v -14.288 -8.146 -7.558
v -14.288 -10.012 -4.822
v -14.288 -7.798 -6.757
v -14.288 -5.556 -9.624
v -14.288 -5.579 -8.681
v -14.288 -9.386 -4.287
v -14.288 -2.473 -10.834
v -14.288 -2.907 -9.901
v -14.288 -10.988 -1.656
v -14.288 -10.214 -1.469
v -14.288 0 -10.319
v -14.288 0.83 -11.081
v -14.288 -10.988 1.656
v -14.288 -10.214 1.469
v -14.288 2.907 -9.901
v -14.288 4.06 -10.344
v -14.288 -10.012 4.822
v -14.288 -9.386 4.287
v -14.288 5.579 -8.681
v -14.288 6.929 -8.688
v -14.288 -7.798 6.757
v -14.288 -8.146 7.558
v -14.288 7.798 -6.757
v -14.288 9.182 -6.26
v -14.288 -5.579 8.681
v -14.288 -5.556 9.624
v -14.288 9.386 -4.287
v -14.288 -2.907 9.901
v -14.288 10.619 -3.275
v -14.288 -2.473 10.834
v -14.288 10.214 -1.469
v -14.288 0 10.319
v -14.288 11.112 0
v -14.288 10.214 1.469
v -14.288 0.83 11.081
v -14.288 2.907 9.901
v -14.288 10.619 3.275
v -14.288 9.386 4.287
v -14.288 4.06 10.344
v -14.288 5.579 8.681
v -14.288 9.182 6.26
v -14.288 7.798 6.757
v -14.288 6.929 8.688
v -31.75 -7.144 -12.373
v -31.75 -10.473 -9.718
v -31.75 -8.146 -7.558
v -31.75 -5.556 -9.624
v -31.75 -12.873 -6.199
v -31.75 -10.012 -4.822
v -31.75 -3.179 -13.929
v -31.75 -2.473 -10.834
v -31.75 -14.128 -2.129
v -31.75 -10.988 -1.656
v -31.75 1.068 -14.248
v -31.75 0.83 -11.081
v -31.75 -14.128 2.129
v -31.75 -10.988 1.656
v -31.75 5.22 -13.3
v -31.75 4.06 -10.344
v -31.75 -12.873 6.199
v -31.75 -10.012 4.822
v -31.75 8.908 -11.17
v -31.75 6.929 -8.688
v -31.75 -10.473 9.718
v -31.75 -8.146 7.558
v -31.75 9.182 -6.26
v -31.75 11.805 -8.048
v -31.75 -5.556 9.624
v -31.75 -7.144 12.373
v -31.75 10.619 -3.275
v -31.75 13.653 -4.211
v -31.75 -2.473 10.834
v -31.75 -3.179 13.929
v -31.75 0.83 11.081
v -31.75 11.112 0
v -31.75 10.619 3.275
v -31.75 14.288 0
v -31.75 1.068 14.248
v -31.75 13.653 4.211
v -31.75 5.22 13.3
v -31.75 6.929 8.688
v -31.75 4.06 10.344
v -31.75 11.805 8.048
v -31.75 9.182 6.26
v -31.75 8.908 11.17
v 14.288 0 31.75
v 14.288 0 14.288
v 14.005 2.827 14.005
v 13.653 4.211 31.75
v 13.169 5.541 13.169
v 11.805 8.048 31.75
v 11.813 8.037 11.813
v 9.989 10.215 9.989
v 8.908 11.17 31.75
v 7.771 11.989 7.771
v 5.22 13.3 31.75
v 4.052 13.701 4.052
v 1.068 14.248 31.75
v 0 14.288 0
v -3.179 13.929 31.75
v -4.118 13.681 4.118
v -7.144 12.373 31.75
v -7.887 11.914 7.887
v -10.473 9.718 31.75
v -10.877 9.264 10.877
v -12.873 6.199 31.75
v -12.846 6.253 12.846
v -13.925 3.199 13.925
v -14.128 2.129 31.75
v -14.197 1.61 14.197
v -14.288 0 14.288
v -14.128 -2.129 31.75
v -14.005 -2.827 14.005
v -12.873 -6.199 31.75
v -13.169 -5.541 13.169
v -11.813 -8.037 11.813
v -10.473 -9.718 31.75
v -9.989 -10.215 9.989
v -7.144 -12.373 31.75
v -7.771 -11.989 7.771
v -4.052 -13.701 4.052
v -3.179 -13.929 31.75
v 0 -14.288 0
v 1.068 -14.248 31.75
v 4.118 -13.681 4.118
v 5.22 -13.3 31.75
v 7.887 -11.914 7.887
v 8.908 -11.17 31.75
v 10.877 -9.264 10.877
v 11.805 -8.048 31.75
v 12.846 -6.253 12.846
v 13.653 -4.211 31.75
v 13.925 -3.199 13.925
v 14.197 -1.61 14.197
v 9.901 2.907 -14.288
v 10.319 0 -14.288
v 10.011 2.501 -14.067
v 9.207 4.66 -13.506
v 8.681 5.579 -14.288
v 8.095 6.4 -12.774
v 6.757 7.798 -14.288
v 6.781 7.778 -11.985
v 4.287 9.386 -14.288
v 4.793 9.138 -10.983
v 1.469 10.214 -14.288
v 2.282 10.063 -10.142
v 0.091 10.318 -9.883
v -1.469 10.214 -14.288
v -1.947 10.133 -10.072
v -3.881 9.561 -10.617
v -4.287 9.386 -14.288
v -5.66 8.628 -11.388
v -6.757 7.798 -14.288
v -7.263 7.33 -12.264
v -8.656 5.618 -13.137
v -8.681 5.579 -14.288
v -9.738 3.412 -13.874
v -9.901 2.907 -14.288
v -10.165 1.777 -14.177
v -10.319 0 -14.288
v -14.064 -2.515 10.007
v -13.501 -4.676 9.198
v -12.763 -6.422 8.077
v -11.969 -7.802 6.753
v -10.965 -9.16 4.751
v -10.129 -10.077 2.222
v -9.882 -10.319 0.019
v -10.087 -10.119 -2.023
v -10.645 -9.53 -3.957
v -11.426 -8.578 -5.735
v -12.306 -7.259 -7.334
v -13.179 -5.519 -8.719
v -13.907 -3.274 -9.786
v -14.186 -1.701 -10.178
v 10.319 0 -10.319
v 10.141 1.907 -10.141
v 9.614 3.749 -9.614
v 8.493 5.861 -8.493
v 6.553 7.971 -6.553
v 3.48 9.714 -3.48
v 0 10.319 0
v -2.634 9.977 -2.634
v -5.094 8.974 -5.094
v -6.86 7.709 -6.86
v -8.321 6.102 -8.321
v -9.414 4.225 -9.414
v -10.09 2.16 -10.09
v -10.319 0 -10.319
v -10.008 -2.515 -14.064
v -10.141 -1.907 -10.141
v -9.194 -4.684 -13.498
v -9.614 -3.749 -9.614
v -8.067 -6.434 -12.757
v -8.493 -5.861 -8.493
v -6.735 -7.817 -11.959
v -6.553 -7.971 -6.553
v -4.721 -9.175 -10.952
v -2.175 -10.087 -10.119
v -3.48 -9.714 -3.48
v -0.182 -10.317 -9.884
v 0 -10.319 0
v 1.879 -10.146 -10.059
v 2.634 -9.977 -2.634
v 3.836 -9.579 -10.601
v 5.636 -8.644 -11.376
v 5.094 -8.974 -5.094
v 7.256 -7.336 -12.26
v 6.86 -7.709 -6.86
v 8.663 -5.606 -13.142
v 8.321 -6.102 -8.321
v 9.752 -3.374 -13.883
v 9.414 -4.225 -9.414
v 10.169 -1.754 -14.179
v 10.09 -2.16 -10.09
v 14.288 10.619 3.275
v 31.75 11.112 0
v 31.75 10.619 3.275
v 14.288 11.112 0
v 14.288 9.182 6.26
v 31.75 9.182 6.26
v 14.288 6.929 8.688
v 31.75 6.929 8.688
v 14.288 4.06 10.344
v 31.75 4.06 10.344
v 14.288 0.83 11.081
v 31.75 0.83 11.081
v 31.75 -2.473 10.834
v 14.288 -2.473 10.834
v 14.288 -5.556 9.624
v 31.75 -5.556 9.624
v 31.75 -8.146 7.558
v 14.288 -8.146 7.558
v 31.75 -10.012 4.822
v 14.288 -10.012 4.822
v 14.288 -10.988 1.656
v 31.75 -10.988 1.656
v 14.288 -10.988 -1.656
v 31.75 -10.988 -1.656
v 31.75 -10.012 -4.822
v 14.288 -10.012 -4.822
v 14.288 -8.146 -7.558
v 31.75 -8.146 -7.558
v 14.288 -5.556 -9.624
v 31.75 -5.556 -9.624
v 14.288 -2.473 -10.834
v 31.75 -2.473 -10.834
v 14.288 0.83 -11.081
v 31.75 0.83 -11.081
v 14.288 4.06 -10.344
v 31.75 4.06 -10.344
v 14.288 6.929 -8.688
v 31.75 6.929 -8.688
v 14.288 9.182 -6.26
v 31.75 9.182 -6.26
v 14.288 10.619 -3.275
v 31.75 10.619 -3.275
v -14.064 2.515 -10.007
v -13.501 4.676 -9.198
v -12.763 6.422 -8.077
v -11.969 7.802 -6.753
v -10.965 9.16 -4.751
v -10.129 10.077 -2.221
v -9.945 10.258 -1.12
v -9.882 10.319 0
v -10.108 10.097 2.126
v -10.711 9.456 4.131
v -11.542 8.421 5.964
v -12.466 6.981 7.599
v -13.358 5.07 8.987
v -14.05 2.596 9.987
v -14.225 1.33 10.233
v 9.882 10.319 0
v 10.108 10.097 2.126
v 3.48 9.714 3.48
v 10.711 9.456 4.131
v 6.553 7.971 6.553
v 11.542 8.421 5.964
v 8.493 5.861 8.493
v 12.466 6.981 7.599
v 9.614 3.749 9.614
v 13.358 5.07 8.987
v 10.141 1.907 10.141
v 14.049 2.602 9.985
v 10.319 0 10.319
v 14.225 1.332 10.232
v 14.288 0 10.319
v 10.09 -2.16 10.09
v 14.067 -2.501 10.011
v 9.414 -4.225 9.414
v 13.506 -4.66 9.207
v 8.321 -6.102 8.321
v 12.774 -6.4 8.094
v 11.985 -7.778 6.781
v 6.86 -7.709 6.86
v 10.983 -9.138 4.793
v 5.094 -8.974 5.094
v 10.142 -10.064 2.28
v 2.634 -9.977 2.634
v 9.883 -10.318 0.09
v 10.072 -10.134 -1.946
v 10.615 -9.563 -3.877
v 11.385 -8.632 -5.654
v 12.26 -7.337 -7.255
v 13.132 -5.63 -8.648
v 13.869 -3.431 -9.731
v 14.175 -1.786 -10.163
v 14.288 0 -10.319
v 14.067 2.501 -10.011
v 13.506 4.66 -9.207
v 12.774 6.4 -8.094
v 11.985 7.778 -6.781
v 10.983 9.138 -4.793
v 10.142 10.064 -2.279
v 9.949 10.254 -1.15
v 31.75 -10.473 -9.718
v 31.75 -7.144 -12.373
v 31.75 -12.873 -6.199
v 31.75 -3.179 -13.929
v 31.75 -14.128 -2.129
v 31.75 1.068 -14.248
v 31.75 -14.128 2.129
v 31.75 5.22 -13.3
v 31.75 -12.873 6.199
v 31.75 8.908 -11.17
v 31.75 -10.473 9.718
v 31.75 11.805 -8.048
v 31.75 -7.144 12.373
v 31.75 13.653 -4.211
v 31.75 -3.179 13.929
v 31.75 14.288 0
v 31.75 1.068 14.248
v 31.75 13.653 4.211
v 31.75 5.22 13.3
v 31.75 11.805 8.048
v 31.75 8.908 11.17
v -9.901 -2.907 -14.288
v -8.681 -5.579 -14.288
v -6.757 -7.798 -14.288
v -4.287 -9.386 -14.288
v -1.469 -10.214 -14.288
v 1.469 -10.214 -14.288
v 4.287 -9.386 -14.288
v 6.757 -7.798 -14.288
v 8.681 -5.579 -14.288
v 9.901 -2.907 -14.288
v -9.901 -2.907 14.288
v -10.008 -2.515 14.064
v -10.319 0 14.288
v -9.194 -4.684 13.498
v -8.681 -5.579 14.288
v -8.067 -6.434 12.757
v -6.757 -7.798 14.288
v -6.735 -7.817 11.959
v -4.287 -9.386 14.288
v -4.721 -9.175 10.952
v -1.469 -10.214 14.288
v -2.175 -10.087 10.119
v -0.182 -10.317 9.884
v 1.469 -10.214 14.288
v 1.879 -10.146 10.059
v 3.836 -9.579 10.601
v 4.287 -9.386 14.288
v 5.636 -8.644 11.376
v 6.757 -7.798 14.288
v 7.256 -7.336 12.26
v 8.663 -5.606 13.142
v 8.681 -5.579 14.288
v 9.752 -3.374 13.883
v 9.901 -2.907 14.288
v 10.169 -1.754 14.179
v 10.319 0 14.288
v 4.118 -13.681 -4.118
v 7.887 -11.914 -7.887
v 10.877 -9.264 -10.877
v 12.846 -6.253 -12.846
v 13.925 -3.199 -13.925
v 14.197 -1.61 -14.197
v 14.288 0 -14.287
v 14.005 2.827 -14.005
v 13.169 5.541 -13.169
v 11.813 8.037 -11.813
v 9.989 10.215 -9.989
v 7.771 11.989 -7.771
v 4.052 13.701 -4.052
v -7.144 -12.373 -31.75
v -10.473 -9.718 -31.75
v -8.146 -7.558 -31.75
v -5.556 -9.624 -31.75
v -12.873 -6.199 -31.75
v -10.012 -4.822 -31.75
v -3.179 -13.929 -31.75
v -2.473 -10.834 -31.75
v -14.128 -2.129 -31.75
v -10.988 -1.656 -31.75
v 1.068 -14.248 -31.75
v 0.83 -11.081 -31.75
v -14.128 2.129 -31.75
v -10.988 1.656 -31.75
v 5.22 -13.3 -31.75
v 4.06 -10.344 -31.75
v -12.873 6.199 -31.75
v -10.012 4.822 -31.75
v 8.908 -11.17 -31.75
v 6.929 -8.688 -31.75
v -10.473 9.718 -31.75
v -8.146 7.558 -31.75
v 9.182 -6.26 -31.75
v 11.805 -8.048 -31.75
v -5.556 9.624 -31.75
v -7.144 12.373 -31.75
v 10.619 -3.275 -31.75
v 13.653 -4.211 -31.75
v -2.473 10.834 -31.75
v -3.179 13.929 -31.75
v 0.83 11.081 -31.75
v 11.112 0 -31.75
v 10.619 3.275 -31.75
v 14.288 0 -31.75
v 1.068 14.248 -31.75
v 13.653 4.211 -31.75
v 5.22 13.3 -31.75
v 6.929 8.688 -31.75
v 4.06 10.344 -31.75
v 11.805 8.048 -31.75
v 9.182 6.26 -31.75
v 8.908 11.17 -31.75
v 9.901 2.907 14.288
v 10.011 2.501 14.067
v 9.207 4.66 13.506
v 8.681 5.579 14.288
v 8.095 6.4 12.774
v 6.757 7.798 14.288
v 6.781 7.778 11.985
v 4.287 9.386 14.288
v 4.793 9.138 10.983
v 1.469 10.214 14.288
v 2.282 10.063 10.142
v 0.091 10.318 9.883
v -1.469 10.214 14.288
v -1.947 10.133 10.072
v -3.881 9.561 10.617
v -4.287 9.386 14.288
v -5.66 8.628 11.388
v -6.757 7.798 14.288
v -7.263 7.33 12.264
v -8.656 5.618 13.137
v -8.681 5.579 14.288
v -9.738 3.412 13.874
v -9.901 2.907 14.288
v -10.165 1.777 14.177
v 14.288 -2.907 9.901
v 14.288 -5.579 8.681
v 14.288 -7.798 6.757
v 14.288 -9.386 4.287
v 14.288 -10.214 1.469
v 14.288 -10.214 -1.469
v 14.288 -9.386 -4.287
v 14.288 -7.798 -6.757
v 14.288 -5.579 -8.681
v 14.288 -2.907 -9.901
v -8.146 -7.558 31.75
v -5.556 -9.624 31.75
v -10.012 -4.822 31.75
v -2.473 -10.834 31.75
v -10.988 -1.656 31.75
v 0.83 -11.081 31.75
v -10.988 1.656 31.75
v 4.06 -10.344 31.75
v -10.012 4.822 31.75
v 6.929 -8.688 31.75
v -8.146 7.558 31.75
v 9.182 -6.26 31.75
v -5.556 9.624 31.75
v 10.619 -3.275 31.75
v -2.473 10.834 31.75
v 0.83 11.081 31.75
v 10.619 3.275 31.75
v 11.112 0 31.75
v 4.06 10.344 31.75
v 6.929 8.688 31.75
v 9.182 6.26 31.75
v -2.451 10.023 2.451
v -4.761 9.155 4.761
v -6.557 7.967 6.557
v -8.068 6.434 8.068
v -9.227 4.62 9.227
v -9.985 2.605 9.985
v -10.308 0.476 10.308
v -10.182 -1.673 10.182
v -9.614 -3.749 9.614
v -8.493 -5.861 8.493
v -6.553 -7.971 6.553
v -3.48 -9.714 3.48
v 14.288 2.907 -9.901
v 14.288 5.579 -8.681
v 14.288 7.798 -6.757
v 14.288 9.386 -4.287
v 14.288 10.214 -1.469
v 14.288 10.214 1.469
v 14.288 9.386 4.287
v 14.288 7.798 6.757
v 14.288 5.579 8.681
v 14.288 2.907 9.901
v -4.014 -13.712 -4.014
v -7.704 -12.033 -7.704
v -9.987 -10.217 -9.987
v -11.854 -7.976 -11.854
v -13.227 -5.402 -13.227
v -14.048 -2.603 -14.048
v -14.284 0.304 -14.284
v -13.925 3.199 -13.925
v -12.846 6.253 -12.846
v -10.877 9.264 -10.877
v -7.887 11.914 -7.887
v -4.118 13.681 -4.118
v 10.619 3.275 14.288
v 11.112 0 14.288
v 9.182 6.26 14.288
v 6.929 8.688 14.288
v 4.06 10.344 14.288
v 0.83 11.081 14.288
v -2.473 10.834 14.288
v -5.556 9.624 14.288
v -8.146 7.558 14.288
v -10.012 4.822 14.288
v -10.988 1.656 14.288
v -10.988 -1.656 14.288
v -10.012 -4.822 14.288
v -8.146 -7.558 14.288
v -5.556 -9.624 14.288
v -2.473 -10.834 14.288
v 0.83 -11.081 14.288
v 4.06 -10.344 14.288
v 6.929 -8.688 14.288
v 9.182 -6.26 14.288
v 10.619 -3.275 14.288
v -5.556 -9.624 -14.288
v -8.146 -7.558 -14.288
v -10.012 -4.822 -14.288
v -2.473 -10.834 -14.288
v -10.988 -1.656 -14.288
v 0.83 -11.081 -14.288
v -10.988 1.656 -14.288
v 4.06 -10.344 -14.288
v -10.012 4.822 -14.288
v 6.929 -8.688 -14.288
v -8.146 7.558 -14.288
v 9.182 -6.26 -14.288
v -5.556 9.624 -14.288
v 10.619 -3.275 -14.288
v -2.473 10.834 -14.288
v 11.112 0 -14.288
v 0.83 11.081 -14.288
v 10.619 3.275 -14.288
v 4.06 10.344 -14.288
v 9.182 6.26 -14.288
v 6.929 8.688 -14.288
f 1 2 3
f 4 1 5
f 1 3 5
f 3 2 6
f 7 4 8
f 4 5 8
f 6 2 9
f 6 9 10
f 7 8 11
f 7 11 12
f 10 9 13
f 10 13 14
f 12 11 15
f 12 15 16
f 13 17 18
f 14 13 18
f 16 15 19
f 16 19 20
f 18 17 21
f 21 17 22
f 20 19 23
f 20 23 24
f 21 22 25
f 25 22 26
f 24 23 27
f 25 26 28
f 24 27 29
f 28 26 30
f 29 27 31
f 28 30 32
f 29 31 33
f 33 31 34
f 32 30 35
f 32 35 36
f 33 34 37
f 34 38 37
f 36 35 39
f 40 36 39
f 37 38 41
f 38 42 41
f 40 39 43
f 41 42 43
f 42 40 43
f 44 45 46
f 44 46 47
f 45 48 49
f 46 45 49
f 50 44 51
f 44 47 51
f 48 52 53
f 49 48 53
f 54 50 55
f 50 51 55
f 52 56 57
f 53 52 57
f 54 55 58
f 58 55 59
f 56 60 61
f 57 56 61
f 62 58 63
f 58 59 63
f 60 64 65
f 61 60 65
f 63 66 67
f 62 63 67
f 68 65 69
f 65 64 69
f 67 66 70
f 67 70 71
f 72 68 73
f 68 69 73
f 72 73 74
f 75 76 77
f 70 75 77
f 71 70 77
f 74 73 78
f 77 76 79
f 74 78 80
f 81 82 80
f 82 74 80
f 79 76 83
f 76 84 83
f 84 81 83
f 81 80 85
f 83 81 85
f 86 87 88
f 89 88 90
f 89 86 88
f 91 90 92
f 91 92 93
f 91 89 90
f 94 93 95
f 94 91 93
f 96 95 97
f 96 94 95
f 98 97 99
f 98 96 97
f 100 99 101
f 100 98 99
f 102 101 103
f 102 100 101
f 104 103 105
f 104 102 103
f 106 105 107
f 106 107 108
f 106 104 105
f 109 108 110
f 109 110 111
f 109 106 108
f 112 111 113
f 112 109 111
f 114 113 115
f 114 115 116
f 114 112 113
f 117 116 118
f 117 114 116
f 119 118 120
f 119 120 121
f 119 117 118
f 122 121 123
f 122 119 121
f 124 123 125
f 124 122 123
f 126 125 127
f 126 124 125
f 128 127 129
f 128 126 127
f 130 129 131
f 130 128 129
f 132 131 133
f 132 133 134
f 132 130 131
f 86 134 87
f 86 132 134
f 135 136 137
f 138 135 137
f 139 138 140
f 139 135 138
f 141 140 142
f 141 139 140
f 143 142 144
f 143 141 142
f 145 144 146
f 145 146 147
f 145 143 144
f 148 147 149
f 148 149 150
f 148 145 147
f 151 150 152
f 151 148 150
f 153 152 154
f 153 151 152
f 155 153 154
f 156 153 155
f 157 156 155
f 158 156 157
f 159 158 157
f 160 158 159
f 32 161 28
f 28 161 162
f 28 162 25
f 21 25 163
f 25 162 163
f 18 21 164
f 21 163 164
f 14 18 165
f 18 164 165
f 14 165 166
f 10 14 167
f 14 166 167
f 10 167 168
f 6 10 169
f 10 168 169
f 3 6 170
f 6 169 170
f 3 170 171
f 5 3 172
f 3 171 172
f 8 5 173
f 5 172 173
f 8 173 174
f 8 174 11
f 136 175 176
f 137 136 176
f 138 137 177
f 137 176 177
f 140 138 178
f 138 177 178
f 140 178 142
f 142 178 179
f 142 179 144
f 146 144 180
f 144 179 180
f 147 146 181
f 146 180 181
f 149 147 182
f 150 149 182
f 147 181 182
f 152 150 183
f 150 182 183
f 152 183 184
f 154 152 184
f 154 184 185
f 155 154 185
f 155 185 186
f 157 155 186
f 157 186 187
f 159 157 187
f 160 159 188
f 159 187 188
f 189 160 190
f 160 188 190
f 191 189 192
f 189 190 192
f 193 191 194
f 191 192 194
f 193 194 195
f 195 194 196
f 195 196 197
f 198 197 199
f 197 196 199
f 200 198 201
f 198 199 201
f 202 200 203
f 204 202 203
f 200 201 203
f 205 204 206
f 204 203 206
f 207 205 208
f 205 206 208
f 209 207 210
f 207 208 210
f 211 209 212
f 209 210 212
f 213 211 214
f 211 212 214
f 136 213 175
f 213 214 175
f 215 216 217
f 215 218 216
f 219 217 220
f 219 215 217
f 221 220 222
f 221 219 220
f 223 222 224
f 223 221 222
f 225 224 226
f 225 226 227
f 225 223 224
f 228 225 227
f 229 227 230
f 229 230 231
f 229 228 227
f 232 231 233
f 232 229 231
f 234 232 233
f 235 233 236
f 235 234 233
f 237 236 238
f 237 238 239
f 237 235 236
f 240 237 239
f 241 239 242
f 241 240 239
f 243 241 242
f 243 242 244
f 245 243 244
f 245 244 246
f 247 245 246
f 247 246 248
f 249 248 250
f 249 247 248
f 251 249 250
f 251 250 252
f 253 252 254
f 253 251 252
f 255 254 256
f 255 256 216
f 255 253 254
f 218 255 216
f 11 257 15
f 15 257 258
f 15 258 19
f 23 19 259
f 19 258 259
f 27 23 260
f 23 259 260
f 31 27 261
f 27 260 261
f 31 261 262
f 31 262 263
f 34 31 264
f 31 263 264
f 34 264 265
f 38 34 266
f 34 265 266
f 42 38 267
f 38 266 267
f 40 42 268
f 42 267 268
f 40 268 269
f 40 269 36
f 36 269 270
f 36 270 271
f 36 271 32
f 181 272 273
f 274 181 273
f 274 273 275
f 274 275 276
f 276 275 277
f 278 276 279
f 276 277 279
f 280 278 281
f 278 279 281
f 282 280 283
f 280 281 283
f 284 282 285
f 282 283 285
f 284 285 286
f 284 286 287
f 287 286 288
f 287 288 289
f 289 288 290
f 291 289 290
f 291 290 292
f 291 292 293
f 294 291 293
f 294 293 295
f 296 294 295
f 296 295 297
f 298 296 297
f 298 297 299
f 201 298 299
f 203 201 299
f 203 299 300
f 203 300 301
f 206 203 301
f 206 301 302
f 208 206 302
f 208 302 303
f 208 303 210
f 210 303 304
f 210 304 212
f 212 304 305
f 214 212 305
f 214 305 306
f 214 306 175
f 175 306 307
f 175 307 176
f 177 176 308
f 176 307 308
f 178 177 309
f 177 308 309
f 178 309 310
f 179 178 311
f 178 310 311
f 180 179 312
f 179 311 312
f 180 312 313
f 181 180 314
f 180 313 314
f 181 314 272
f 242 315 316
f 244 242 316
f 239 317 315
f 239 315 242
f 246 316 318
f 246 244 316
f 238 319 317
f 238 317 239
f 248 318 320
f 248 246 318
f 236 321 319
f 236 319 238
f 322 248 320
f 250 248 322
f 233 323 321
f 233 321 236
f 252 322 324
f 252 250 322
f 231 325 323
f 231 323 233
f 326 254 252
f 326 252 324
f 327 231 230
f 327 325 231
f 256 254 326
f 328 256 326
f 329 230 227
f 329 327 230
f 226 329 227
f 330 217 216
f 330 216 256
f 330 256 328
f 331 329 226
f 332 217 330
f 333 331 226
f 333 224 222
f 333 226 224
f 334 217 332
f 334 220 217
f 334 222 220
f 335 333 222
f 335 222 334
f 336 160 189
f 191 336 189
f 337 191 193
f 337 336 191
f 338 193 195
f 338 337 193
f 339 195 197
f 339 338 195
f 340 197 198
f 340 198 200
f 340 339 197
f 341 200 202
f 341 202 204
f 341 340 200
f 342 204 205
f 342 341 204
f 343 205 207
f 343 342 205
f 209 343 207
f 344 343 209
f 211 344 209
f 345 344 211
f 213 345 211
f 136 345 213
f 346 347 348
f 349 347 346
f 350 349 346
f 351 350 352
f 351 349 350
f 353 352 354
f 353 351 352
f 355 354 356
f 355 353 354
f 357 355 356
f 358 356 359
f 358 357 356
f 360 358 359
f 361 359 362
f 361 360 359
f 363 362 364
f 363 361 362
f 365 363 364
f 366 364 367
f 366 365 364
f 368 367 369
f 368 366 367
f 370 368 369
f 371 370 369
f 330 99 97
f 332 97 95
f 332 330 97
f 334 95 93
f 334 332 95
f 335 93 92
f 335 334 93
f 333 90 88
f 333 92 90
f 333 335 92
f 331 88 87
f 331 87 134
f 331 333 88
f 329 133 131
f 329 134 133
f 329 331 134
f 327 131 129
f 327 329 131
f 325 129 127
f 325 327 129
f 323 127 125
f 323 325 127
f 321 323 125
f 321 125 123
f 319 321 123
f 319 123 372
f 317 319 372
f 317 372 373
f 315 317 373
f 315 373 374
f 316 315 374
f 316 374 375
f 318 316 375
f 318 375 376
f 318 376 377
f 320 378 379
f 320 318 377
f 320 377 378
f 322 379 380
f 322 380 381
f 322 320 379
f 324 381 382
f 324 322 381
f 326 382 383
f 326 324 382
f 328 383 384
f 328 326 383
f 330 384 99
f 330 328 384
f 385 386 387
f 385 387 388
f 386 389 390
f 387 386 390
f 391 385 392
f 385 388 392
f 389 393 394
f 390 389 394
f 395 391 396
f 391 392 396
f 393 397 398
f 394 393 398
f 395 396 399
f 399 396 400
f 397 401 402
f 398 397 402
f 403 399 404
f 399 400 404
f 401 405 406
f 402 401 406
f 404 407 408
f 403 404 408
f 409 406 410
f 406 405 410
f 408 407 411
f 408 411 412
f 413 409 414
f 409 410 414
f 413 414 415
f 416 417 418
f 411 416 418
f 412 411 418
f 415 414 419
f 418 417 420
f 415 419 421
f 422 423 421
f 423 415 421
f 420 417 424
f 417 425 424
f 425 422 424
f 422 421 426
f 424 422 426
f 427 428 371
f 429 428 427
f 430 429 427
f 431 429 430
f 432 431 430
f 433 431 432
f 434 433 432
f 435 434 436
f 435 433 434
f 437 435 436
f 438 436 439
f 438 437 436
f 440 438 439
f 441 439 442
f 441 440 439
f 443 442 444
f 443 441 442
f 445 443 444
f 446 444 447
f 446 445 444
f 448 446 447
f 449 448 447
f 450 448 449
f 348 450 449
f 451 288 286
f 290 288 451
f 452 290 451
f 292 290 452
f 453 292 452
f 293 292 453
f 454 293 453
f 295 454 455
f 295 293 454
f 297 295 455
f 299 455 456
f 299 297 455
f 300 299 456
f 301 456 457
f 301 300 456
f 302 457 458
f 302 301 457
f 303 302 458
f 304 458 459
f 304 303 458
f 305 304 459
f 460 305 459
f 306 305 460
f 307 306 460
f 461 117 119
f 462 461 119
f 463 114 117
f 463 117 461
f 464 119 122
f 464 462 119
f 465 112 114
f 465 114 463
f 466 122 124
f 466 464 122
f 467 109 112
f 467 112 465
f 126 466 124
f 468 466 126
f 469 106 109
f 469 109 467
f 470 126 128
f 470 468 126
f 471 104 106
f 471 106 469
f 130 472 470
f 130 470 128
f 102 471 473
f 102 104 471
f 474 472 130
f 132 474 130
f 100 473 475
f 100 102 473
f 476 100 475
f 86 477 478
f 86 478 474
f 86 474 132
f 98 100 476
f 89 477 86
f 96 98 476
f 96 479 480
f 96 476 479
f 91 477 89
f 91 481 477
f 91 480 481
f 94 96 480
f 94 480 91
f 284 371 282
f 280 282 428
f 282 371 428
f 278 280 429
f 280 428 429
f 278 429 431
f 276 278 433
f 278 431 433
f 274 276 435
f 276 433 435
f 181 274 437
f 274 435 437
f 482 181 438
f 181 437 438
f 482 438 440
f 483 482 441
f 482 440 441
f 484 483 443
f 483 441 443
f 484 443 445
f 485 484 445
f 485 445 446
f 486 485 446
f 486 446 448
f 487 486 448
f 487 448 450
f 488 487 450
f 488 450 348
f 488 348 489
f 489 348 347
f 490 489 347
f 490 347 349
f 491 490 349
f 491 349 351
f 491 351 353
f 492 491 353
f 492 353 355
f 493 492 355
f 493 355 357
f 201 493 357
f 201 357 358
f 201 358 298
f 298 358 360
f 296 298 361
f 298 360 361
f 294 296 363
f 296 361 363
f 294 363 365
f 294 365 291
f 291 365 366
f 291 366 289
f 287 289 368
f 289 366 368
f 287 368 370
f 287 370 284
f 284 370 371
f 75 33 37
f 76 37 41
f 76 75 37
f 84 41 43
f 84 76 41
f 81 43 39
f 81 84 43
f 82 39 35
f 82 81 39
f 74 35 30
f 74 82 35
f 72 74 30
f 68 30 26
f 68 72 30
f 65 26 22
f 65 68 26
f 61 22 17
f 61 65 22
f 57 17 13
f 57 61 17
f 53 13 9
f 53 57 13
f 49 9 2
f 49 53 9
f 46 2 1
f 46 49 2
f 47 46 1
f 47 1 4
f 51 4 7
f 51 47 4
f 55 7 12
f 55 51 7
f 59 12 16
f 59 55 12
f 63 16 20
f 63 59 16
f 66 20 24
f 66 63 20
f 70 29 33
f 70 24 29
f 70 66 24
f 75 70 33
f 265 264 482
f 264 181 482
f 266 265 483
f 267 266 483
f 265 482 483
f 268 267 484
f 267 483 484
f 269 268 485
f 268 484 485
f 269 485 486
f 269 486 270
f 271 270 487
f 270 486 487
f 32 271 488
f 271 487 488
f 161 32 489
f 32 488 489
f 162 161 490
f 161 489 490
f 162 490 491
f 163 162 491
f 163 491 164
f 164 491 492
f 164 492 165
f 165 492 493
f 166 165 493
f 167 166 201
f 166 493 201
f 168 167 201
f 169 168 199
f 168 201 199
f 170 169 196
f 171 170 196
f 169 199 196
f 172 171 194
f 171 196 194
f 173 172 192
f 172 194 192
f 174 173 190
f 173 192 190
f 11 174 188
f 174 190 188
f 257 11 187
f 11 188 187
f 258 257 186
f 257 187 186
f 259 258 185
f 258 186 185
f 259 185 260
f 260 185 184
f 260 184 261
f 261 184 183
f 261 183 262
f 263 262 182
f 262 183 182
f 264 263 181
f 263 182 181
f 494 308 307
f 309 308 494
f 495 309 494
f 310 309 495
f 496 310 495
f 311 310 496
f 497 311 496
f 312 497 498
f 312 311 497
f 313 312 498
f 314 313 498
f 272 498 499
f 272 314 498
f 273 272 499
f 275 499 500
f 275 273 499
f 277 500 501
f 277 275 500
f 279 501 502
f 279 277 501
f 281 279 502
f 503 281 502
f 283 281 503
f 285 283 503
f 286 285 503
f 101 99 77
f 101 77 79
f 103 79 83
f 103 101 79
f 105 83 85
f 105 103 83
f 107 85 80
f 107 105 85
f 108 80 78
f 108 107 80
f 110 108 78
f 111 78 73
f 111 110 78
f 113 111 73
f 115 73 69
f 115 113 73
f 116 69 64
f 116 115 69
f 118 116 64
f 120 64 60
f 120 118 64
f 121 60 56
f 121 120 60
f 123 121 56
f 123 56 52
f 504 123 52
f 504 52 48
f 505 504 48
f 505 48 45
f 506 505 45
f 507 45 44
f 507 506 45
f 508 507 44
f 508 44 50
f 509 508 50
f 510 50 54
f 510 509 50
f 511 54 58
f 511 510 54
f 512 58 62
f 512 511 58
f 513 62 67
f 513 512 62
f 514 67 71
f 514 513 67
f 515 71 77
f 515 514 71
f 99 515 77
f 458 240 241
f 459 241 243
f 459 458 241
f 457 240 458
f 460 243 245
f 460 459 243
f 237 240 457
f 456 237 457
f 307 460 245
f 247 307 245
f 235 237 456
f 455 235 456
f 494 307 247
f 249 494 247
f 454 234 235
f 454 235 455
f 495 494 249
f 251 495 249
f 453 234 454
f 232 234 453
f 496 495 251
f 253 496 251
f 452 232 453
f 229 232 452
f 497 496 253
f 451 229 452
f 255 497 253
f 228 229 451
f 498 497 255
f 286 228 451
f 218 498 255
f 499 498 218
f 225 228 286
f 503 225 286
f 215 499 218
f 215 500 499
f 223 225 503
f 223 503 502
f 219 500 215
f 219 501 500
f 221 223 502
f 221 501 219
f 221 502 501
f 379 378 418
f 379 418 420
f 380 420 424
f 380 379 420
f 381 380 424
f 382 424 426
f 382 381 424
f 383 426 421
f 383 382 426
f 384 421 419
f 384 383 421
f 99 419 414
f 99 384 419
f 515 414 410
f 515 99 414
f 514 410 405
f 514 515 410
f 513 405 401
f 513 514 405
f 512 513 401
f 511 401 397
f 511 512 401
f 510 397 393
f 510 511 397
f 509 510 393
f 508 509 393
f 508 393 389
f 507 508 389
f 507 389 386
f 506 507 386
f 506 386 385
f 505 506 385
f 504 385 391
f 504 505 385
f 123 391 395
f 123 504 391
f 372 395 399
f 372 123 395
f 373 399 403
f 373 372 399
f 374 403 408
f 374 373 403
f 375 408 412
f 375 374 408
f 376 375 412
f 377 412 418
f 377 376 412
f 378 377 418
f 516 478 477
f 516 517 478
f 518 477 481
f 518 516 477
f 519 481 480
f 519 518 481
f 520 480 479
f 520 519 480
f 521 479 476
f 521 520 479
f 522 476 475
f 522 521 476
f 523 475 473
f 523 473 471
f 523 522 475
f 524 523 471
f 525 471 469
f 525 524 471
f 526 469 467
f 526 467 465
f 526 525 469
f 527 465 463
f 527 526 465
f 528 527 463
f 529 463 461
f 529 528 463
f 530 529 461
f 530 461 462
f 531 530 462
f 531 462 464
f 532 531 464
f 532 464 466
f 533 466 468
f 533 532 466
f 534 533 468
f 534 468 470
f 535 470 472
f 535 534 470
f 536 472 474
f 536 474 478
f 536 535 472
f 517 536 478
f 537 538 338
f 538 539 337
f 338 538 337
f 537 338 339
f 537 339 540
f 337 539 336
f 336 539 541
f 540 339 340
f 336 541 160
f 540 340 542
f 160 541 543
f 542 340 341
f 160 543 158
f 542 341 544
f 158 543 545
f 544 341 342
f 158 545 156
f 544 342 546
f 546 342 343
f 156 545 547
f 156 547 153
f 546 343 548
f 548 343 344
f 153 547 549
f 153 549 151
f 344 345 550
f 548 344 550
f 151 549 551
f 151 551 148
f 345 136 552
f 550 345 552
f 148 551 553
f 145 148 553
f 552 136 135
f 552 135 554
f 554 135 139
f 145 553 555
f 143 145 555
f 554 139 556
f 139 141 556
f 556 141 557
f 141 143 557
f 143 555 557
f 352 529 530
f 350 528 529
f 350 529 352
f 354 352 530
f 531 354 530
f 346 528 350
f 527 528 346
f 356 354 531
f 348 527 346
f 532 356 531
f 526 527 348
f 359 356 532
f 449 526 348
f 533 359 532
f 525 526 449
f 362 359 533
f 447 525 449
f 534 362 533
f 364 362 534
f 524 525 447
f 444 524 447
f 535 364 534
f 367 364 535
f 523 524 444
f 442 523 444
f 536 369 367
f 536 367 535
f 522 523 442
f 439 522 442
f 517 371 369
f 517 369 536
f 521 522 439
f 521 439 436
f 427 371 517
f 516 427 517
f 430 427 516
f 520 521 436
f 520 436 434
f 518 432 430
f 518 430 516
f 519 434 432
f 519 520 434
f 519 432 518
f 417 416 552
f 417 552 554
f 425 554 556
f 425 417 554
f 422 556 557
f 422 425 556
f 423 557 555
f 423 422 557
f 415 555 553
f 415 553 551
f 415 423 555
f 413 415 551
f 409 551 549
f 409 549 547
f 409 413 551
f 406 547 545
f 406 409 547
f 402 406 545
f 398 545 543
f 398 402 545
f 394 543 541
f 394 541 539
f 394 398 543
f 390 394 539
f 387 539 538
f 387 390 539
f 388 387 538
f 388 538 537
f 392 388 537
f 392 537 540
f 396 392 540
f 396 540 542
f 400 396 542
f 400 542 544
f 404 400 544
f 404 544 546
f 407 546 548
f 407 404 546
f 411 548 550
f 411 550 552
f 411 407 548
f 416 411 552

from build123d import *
from build123d import SkipClean  # not in build123d's __all__

# Parameters (mm, degrees)
F0_R     = 14.2875
F0_R_2   = 11.1125
F1_DEPTH = 31.75
F0_R_3   = 10.31875
F2_DEPTH = 14.2875
F3_R     = 14.2875
F3_R_2   = 11.1125
F4_DEPTH = 31.75
F3_R_3   = 10.31875
F5_DEPTH = 14.2875
F6_DEPTH = 14.2875
F7_DEPTH = 14.2875


with BuildPart() as f1:
    # F0 (on Top) → F1 (new body, symmetric)
    with BuildSketch(Plane.XY):
        Circle(F0_R)
        Circle(F0_R_2, mode=Mode.SUBTRACT)
    extrude(amount=F1_DEPTH, both=True)

    # F0 (on Top) → F2 (join, symmetric)
    with BuildSketch(Plane.XY):
        Circle(F0_R_2)
        Circle(F0_R_3, mode=Mode.SUBTRACT)
    extrude(amount=F2_DEPTH, both=True)

    # F3 (on Right) → F4 (join, symmetric)
    with BuildSketch(Plane.YZ):
        Circle(F3_R)
        Circle(F3_R_2, mode=Mode.SUBTRACT)
    extrude(amount=F4_DEPTH, both=True)

    # F3 (on Right) → F5 (join, symmetric)
    with BuildSketch(Plane.YZ):
        Circle(F3_R_2)
        Circle(F3_R_3, mode=Mode.SUBTRACT)
    with SkipClean():  # cleaning this boolean's faces spoils the solid; the shape is the same uncleaned
        extrude(amount=F5_DEPTH, both=True)

    # F0 (on Top) → F6 (cut, symmetric)
    with BuildSketch(Plane.XY):
        Circle(F0_R_3)
    with SkipClean():  # cleaning this boolean's faces spoils the solid; the shape is the same uncleaned
        extrude(amount=F6_DEPTH, both=True, mode=Mode.SUBTRACT)

    # F3 (on Right) → F7 (cut, symmetric)
    with BuildSketch(Plane.YZ):
        Circle(F3_R_3)
    extrude(amount=F7_DEPTH, both=True, mode=Mode.SUBTRACT)


solid = f1.part
